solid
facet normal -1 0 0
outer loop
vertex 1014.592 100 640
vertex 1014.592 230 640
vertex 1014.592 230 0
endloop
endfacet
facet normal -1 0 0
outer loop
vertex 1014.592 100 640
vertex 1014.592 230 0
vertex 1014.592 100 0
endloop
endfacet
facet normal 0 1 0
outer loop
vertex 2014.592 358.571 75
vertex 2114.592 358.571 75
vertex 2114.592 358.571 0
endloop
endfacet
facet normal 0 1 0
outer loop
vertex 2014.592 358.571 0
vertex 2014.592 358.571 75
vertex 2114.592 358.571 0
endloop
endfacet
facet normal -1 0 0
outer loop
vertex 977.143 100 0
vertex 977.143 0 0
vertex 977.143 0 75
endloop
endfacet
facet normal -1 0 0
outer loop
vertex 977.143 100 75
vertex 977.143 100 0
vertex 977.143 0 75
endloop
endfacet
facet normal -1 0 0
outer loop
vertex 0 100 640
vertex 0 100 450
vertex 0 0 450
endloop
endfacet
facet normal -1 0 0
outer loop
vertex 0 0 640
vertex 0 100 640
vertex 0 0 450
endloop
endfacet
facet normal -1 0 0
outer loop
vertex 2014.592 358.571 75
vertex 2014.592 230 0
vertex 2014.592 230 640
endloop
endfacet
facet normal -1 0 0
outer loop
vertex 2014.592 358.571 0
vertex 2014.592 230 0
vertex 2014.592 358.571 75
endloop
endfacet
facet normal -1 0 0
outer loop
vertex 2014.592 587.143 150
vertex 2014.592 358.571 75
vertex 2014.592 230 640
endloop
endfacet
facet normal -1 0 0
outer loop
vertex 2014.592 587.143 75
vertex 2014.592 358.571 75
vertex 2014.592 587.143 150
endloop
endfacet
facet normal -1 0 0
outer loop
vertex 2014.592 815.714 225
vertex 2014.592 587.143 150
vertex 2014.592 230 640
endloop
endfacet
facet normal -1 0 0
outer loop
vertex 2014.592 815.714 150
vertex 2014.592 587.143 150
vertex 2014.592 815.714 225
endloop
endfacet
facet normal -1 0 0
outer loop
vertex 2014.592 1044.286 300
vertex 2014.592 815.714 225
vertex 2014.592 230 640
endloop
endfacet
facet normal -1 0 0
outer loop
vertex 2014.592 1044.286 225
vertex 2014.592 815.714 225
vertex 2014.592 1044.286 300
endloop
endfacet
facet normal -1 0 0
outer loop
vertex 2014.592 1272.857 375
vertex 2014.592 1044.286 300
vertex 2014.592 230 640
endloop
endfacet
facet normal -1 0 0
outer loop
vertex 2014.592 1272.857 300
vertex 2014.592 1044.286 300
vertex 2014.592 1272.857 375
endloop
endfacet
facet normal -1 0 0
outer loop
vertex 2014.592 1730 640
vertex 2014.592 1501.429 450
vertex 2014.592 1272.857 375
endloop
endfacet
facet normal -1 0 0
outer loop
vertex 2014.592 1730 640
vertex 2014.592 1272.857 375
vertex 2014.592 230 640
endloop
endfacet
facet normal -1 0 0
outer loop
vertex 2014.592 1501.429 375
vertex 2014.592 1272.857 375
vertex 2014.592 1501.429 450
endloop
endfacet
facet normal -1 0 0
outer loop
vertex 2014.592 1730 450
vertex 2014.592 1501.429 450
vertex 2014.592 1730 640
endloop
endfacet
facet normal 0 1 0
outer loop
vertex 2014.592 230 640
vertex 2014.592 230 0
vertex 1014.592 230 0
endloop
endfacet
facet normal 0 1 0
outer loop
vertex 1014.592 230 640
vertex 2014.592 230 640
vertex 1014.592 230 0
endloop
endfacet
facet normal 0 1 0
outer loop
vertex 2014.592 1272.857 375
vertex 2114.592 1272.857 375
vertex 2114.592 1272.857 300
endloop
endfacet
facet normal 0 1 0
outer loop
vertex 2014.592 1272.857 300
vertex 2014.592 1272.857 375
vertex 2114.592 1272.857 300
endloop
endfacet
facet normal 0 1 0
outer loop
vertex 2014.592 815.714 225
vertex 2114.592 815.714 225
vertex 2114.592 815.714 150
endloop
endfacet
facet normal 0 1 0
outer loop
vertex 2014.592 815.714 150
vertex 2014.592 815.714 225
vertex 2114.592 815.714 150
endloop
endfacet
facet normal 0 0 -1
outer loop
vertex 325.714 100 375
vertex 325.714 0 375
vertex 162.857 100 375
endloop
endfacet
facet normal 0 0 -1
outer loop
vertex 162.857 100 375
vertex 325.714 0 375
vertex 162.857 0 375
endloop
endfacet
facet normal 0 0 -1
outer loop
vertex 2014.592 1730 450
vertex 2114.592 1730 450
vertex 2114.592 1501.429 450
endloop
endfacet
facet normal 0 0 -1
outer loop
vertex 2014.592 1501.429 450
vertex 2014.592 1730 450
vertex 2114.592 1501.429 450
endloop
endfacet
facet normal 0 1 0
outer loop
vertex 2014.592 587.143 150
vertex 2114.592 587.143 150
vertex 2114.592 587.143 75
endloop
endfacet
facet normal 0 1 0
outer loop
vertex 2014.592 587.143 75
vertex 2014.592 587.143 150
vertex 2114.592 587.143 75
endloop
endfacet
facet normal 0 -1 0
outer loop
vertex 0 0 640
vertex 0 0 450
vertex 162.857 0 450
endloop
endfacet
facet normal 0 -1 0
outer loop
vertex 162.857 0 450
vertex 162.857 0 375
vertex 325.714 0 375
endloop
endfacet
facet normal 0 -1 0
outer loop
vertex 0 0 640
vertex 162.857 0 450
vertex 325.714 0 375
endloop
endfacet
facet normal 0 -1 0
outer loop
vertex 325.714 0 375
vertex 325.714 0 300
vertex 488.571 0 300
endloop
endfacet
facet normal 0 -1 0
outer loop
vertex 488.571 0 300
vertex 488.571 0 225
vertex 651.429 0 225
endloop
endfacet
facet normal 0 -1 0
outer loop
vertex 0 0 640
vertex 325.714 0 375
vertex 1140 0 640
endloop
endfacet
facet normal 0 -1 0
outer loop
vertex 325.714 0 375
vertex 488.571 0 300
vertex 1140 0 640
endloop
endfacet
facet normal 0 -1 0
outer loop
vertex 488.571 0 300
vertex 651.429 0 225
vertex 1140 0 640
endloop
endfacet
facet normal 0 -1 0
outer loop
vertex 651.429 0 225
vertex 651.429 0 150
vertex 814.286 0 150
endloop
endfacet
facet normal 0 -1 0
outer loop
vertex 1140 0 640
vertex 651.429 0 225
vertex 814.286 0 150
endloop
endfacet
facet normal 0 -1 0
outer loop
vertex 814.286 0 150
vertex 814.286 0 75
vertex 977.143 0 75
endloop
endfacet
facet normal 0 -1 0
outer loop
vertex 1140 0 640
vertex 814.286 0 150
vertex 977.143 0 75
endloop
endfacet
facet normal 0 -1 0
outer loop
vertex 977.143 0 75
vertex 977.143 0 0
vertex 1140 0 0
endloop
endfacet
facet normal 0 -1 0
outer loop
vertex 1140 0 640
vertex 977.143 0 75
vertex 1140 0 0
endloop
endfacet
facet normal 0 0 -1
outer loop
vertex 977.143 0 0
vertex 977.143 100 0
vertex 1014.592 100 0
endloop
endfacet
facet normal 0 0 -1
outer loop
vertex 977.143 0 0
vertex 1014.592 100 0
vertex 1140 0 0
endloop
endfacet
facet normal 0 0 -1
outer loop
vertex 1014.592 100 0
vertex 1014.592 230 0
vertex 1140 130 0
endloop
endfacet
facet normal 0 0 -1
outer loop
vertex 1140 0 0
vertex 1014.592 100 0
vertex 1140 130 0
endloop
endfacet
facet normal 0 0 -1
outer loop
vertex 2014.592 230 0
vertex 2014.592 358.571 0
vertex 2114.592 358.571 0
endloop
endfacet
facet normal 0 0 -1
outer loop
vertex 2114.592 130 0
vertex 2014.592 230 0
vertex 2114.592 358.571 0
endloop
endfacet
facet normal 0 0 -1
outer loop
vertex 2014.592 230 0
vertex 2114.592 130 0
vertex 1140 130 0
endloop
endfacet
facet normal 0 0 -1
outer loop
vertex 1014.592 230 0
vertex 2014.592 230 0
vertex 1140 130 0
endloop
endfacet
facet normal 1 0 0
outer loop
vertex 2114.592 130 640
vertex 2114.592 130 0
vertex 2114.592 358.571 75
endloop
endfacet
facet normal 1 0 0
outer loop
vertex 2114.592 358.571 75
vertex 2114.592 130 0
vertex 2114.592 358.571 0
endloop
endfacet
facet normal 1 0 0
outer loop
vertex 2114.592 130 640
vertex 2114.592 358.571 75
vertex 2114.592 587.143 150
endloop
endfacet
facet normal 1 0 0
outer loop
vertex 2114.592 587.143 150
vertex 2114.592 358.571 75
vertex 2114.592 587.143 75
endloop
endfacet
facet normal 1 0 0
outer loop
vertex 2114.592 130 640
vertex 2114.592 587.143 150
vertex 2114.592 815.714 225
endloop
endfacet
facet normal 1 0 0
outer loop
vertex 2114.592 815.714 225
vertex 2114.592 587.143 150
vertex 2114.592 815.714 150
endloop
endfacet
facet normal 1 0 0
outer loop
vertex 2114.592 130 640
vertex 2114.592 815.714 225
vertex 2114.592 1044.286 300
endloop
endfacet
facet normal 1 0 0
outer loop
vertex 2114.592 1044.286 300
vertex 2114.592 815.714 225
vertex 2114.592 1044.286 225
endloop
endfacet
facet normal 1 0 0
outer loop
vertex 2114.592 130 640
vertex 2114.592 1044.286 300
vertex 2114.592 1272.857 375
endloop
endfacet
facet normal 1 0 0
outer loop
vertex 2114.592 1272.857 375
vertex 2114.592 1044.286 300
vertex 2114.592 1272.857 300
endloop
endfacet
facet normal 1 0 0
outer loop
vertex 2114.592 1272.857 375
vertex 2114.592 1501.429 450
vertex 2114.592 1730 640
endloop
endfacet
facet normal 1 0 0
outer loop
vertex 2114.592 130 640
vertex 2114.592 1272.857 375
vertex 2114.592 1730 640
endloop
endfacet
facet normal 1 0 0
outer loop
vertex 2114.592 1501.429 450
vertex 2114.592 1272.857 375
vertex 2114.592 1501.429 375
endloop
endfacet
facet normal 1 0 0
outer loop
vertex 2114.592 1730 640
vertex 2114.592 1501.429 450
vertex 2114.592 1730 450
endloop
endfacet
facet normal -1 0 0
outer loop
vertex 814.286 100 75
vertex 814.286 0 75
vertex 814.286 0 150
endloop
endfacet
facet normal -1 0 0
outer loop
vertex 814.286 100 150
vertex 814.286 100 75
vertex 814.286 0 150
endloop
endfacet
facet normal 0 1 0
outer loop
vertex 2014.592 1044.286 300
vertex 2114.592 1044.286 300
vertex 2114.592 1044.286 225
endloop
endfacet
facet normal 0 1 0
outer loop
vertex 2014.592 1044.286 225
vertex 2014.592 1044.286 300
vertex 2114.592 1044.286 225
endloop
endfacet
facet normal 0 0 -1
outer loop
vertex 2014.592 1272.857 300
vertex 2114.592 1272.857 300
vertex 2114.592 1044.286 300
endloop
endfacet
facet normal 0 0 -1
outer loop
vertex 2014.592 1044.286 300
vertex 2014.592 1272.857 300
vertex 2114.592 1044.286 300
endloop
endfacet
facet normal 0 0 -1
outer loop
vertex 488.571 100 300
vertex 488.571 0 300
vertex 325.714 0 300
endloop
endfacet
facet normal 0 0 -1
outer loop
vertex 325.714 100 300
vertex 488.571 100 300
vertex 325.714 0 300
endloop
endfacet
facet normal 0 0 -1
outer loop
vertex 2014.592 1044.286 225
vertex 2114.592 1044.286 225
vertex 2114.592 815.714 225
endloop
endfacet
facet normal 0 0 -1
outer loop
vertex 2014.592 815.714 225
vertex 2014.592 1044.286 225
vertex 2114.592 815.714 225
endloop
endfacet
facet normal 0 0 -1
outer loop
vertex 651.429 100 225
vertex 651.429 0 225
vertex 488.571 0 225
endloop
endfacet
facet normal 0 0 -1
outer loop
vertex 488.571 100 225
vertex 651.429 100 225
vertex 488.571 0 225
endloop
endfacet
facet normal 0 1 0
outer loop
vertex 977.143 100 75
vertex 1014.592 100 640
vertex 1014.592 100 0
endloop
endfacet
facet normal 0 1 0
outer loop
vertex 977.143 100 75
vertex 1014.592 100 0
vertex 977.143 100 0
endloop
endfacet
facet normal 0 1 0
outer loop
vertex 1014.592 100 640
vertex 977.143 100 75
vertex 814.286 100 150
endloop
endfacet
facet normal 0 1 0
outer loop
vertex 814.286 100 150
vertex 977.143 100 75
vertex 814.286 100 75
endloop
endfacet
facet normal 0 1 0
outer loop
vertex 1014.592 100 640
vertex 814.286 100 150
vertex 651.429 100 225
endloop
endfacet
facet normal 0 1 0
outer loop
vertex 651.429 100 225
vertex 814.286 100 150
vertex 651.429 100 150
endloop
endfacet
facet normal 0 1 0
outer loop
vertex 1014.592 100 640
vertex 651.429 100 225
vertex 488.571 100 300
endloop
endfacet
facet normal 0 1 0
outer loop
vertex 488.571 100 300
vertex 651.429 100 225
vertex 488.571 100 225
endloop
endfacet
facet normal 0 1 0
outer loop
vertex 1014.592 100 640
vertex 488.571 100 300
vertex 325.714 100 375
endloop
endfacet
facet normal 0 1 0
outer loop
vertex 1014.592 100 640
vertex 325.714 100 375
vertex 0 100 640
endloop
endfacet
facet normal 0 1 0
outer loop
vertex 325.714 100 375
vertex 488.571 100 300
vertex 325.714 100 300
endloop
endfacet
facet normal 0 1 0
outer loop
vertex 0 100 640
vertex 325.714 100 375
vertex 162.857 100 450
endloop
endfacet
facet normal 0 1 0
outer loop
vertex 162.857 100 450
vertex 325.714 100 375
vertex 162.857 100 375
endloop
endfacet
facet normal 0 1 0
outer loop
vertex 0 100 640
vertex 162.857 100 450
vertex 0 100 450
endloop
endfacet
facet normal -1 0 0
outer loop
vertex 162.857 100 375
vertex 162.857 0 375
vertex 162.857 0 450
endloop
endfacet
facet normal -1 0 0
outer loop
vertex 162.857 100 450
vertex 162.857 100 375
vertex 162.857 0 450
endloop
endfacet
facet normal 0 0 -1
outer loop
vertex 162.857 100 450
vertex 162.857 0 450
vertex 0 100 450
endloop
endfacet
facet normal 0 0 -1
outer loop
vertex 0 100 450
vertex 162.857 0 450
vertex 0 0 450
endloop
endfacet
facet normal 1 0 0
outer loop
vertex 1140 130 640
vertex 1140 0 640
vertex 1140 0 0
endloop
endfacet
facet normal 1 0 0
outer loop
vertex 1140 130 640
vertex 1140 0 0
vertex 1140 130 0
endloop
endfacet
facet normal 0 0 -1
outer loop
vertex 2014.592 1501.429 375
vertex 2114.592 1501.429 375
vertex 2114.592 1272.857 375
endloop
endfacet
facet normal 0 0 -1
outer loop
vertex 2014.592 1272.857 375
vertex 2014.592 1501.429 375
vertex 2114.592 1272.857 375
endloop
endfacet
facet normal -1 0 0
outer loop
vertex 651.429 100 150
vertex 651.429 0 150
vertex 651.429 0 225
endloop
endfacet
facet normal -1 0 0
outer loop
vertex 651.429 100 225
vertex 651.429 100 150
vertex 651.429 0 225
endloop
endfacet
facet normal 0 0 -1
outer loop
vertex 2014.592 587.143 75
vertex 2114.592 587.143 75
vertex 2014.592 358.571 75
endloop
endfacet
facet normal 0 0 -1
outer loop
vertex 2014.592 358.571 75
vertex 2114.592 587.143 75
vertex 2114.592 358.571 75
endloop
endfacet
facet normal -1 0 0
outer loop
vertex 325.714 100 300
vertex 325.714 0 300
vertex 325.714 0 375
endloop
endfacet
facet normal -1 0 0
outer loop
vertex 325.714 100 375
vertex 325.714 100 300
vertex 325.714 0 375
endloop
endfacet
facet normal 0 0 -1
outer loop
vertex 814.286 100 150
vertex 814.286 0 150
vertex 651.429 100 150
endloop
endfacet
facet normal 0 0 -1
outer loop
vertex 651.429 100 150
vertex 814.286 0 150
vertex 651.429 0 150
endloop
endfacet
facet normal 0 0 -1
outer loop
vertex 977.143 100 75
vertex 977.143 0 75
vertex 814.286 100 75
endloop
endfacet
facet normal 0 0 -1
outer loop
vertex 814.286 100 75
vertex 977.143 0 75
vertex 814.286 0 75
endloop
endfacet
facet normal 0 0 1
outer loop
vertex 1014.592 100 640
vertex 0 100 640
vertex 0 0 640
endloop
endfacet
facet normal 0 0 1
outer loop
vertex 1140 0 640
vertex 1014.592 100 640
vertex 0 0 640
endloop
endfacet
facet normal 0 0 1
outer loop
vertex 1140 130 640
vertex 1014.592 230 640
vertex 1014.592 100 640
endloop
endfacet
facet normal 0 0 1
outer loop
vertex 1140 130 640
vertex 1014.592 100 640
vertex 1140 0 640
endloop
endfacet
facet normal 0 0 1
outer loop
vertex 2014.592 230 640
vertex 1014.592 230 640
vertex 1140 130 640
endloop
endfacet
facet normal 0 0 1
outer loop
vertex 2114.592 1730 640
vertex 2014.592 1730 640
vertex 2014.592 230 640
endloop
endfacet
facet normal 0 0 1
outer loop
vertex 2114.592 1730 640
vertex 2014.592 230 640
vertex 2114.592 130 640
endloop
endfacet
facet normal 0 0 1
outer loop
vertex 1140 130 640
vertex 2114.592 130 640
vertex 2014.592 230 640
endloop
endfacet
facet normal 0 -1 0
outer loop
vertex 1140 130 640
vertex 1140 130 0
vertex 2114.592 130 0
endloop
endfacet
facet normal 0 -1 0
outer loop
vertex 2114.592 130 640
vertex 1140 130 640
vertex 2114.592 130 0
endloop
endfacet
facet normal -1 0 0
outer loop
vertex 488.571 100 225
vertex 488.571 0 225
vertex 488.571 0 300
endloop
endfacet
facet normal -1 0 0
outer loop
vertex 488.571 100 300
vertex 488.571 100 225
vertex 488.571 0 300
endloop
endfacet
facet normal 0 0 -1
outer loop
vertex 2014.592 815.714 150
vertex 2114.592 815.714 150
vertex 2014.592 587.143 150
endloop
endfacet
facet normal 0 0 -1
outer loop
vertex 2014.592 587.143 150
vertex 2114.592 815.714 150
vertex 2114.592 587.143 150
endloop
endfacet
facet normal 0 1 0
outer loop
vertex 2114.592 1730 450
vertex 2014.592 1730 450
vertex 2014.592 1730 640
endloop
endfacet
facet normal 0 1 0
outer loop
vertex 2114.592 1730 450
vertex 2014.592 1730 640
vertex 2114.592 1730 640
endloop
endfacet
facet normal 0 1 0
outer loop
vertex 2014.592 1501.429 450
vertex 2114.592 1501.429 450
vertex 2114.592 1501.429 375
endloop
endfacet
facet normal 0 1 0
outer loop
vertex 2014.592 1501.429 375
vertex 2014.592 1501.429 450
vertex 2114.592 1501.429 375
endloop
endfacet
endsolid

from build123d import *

# Parameters (mm, degrees)
F0_W     = 125.408068
F0_H     = 30
F0_W_2   = 100
F0_H_2   = 1500
F1_DEPTH = 640
F3_DEPTH = 1730.001
F5_DEPTH = 2114.592932


with BuildPart() as f1:
    # F0 (on Top) → F1 (new body)
    with BuildSketch(Plane.XY):
        Polygon((0, 100), (0, 0), (1140, 0), (1140, 100), (1014.591932, 100), align=None)
        with Locations((1077.295966, 115)):
            Rectangle(F0_W, F0_H)
        Polygon((1014.591932, 130), (1140, 130), (2114.591932, 130), (2114.591932, 230), (2014.591932, 230), (1014.591932, 230), align=None)
        with Locations((2064.591932, 980)):
            Rectangle(F0_W_2, F0_H_2)
    extrude(amount=F1_DEPTH)

    # F2 (on face) → F3 (cut, through all)
    with BuildSketch(Plane.XZ):
        Polygon((162.857143, 450), (0, 450), (0, 0), (977.142857, 0), (977.142857, 75), (814.285714, 75), (814.285714, 150), (651.428571, 150), (651.428571, 225), (488.571429, 225), (488.571429, 300), (325.714286, 300), (325.714286, 375), (162.857143, 375), align=None)
    extrude(amount=-F3_DEPTH, mode=Mode.SUBTRACT)

    # F4 (on face) → F5 (cut, through all)
    with BuildSketch(Plane.YZ.offset(2114.591932)):
        Polygon((1272.857143, 375), (1272.857143, 300), (1044.285714, 300), (1044.285714, 225), (815.714286, 225), (815.714286, 150), (587.142857, 150), (587.142857, 75), (358.571429, 75), (358.571429, 0), (1730, 0), (1730, 450), (1501.428571, 450), (1501.428571, 375), align=None)
    extrude(amount=-F5_DEPTH, mode=Mode.SUBTRACT)


solid = f1.part
